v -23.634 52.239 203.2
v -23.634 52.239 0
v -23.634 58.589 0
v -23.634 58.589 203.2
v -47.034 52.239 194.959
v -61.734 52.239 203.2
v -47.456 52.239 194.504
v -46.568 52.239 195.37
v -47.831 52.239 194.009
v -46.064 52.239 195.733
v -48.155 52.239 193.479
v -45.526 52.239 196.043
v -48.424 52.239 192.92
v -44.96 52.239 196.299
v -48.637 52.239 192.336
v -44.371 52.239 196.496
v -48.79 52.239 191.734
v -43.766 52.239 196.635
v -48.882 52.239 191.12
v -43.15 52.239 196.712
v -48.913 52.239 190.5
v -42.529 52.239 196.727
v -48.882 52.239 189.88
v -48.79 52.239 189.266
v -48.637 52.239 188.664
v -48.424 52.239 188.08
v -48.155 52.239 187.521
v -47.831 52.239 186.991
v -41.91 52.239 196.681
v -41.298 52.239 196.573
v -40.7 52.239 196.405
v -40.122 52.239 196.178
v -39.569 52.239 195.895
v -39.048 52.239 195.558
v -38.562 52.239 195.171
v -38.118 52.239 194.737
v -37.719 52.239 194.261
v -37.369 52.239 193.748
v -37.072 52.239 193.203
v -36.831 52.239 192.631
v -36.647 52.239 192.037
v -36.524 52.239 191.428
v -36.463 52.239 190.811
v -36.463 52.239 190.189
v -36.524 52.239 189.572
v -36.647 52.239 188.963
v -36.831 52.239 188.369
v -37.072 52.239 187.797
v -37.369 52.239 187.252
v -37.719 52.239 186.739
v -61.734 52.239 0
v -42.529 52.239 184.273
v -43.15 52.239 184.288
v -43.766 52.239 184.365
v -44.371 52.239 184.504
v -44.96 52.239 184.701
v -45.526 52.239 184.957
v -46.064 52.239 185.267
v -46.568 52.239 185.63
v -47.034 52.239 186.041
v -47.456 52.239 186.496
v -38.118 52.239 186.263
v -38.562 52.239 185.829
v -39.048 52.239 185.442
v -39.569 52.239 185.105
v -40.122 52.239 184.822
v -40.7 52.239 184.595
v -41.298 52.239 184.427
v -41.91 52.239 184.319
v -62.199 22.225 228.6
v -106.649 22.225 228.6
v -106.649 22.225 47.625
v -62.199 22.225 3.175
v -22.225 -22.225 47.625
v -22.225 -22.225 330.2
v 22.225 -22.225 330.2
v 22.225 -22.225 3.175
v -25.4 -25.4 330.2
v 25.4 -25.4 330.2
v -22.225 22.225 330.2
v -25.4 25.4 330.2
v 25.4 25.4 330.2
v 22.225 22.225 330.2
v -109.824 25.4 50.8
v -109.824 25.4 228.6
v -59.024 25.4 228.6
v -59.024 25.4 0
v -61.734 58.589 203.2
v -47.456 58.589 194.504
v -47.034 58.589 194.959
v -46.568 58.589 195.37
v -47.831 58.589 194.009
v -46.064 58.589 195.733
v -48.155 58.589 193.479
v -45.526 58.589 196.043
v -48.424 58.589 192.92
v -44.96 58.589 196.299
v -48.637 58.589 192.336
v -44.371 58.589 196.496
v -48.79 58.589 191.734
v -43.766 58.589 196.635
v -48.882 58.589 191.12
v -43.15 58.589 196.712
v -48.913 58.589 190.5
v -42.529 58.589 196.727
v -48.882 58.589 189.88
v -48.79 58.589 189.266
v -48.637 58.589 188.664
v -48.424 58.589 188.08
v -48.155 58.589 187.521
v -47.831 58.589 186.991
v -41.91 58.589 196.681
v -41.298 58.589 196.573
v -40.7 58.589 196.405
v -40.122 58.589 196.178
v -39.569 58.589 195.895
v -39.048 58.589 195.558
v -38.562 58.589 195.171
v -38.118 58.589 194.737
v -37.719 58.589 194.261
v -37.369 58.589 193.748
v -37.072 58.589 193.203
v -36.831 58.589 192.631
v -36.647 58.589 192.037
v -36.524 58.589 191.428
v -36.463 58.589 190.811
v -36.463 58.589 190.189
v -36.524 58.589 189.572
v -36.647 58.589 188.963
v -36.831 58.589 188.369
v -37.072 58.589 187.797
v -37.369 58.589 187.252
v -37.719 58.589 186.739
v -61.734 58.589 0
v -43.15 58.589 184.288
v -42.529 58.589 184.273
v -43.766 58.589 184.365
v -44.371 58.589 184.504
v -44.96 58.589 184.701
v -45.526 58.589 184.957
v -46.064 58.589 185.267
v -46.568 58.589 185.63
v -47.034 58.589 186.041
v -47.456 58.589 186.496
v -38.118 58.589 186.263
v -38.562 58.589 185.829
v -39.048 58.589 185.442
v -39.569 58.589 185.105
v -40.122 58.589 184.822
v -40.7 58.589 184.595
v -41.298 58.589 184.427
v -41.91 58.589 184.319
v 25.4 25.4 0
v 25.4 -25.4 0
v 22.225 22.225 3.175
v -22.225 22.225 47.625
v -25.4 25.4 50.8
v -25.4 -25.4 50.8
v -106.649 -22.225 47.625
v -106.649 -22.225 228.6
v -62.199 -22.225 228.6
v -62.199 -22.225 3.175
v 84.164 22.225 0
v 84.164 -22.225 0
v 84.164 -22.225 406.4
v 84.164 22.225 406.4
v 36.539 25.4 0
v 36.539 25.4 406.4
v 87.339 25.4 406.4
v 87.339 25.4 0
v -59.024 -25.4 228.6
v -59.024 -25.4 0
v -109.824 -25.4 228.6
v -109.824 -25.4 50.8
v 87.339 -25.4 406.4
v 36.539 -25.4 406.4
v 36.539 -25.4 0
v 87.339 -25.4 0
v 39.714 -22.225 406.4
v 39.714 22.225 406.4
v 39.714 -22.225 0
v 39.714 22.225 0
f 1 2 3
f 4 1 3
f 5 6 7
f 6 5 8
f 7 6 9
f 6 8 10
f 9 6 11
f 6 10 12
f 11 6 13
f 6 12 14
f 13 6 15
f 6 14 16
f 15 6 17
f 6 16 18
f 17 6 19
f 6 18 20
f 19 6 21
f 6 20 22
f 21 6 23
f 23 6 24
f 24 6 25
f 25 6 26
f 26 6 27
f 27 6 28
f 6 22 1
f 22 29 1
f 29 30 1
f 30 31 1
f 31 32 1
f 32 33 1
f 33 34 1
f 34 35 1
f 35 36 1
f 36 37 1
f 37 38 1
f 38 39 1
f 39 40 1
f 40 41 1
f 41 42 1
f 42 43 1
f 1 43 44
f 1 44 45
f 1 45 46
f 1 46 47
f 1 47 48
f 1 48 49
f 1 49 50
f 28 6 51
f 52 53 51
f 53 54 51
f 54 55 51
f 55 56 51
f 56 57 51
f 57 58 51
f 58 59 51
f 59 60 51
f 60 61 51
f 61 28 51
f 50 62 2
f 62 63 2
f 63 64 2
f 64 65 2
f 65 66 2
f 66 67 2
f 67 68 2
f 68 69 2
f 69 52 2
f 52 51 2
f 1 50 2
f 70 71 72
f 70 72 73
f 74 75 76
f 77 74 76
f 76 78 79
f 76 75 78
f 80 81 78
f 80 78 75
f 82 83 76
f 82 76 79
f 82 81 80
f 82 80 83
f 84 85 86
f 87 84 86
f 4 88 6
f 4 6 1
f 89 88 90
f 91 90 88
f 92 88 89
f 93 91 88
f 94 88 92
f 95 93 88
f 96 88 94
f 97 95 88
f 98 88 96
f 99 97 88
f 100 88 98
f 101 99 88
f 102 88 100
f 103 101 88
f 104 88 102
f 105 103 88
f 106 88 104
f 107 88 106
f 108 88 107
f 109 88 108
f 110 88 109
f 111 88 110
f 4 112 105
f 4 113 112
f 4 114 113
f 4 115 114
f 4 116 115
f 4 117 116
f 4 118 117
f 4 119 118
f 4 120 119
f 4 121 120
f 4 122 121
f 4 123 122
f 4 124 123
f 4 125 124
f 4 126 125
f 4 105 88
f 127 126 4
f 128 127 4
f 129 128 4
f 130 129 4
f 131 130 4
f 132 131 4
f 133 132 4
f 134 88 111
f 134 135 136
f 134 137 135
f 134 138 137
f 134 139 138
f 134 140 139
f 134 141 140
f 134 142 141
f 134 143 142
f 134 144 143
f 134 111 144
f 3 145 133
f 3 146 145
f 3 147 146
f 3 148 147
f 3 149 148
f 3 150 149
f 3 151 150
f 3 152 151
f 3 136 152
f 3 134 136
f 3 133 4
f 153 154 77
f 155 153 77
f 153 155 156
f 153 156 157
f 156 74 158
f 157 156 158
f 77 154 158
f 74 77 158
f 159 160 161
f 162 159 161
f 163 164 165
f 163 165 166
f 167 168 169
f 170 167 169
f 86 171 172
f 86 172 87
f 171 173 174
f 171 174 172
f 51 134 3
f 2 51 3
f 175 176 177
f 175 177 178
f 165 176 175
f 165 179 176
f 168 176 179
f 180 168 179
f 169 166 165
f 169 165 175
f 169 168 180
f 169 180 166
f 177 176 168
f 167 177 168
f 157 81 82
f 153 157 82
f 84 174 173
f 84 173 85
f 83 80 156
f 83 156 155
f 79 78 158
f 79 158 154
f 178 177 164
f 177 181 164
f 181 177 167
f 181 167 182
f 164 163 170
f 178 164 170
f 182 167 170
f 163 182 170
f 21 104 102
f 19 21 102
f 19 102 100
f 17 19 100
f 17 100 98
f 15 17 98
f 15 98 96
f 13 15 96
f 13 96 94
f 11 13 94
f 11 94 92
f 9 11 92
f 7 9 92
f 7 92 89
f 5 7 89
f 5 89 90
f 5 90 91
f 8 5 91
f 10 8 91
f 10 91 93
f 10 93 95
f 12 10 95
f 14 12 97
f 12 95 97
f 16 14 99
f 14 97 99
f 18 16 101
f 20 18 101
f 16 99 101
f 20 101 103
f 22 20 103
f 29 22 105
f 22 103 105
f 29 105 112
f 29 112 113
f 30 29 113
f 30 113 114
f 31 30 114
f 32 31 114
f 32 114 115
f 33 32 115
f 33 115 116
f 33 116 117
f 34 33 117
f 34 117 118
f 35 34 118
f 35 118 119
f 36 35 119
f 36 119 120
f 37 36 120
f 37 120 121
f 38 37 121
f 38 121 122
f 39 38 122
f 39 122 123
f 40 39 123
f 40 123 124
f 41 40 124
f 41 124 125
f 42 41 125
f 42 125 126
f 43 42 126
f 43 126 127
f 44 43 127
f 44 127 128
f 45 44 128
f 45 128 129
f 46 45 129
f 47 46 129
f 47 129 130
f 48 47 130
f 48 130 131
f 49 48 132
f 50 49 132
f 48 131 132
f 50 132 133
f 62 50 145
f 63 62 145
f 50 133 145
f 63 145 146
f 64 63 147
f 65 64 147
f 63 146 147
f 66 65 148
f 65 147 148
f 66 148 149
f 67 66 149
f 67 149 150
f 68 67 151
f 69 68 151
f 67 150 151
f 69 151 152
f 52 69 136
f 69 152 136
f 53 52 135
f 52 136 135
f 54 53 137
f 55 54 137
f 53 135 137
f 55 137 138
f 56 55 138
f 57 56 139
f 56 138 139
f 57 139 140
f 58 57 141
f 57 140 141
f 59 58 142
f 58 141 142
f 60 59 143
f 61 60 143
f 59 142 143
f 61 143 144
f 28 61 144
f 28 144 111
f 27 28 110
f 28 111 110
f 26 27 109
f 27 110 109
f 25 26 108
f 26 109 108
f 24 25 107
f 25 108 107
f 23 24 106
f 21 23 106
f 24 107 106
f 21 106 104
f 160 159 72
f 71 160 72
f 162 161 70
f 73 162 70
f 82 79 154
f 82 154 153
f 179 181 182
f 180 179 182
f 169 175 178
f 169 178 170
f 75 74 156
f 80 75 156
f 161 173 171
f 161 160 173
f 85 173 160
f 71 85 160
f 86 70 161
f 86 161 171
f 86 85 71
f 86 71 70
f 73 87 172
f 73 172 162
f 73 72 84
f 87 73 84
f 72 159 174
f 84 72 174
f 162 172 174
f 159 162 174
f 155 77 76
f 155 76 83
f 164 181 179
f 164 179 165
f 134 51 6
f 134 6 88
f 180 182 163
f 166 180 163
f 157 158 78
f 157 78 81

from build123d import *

# Parameters (mm, degrees)
F0_W      = 50.8
F0_H      = 50.8
F0_W_2    = 44.45
F0_H_2    = 44.45
F1_DEPTH  = 228.6
F2_DEPTH  = 330.2
F3_DEPTH  = 406.4
F5_DEPTH  = 50.8
F7_DEPTH  = 50.8
F8_W      = 38.1
F8_H      = 6.35
F9_DEPTH  = 203.2
F10_R     = 6.229209
F11_DEPTH = 25.4


with BuildPart() as f1:
    # F0 (on Top) → F1 (new body)
    with BuildSketch(Plane.XY):
        with Locations((-84.423612, 0)):
            Rectangle(F0_W, F0_H)
        with Locations((-84.423612, 0)):
            Rectangle(F0_W_2, F0_H_2, mode=Mode.SUBTRACT)
    extrude(amount=F1_DEPTH)

    # F4 (on face) → F5 (cut)
    with BuildSketch(Plane.XZ.offset(25.4)):
        Polygon((-109.823612, 0), (-59.023612, 0), (-109.823612, 50.8), align=None)
    extrude(amount=-F5_DEPTH, mode=Mode.SUBTRACT)


with BuildPart() as f2:
    # F0 (on Top) → F2 (new body)
    with BuildSketch(Plane.XY):
        Rectangle(F0_W, F0_H)
        Rectangle(F0_W_2, F0_H_2, mode=Mode.SUBTRACT)
    extrude(amount=F2_DEPTH)

    # F6 (on face) → F7 (cut)
    with BuildSketch(Plane.XZ.offset(25.4)):
        Polygon((-25.4, 0), (25.4, 0), (-25.4, 50.8), align=None)
    extrude(amount=-F7_DEPTH, mode=Mode.SUBTRACT)


with BuildPart() as f3:
    # F0 (on Top) → F3 (new body)
    with BuildSketch(Plane.XY):
        with Locations((61.939263, 0)):
            Rectangle(F0_W, F0_H)
        with Locations((61.939263, 0)):
            Rectangle(F0_W_2, F0_H_2, mode=Mode.SUBTRACT)
    extrude(amount=F3_DEPTH)


with BuildPart() as f9:
    # F8 (on Top) → F9 (new body)
    with BuildSketch(Plane.XY):
        with Locations((-42.684071, 55.413668)):
            Rectangle(F8_W, F8_H)
    extrude(amount=F9_DEPTH)

    # F10 (on face) → F11 (cut)
    with BuildSketch(Plane(origin=(0, 58.588668, 0), x_dir=(-1, 0, 0), z_dir=(0, 1, 0))):
        with Locations((42.684071, 190.5)):
            Circle(F10_R)
    extrude(amount=-F11_DEPTH, mode=Mode.SUBTRACT)


solid = Compound([f1.part, f2.part, f3.part, f9.part])
